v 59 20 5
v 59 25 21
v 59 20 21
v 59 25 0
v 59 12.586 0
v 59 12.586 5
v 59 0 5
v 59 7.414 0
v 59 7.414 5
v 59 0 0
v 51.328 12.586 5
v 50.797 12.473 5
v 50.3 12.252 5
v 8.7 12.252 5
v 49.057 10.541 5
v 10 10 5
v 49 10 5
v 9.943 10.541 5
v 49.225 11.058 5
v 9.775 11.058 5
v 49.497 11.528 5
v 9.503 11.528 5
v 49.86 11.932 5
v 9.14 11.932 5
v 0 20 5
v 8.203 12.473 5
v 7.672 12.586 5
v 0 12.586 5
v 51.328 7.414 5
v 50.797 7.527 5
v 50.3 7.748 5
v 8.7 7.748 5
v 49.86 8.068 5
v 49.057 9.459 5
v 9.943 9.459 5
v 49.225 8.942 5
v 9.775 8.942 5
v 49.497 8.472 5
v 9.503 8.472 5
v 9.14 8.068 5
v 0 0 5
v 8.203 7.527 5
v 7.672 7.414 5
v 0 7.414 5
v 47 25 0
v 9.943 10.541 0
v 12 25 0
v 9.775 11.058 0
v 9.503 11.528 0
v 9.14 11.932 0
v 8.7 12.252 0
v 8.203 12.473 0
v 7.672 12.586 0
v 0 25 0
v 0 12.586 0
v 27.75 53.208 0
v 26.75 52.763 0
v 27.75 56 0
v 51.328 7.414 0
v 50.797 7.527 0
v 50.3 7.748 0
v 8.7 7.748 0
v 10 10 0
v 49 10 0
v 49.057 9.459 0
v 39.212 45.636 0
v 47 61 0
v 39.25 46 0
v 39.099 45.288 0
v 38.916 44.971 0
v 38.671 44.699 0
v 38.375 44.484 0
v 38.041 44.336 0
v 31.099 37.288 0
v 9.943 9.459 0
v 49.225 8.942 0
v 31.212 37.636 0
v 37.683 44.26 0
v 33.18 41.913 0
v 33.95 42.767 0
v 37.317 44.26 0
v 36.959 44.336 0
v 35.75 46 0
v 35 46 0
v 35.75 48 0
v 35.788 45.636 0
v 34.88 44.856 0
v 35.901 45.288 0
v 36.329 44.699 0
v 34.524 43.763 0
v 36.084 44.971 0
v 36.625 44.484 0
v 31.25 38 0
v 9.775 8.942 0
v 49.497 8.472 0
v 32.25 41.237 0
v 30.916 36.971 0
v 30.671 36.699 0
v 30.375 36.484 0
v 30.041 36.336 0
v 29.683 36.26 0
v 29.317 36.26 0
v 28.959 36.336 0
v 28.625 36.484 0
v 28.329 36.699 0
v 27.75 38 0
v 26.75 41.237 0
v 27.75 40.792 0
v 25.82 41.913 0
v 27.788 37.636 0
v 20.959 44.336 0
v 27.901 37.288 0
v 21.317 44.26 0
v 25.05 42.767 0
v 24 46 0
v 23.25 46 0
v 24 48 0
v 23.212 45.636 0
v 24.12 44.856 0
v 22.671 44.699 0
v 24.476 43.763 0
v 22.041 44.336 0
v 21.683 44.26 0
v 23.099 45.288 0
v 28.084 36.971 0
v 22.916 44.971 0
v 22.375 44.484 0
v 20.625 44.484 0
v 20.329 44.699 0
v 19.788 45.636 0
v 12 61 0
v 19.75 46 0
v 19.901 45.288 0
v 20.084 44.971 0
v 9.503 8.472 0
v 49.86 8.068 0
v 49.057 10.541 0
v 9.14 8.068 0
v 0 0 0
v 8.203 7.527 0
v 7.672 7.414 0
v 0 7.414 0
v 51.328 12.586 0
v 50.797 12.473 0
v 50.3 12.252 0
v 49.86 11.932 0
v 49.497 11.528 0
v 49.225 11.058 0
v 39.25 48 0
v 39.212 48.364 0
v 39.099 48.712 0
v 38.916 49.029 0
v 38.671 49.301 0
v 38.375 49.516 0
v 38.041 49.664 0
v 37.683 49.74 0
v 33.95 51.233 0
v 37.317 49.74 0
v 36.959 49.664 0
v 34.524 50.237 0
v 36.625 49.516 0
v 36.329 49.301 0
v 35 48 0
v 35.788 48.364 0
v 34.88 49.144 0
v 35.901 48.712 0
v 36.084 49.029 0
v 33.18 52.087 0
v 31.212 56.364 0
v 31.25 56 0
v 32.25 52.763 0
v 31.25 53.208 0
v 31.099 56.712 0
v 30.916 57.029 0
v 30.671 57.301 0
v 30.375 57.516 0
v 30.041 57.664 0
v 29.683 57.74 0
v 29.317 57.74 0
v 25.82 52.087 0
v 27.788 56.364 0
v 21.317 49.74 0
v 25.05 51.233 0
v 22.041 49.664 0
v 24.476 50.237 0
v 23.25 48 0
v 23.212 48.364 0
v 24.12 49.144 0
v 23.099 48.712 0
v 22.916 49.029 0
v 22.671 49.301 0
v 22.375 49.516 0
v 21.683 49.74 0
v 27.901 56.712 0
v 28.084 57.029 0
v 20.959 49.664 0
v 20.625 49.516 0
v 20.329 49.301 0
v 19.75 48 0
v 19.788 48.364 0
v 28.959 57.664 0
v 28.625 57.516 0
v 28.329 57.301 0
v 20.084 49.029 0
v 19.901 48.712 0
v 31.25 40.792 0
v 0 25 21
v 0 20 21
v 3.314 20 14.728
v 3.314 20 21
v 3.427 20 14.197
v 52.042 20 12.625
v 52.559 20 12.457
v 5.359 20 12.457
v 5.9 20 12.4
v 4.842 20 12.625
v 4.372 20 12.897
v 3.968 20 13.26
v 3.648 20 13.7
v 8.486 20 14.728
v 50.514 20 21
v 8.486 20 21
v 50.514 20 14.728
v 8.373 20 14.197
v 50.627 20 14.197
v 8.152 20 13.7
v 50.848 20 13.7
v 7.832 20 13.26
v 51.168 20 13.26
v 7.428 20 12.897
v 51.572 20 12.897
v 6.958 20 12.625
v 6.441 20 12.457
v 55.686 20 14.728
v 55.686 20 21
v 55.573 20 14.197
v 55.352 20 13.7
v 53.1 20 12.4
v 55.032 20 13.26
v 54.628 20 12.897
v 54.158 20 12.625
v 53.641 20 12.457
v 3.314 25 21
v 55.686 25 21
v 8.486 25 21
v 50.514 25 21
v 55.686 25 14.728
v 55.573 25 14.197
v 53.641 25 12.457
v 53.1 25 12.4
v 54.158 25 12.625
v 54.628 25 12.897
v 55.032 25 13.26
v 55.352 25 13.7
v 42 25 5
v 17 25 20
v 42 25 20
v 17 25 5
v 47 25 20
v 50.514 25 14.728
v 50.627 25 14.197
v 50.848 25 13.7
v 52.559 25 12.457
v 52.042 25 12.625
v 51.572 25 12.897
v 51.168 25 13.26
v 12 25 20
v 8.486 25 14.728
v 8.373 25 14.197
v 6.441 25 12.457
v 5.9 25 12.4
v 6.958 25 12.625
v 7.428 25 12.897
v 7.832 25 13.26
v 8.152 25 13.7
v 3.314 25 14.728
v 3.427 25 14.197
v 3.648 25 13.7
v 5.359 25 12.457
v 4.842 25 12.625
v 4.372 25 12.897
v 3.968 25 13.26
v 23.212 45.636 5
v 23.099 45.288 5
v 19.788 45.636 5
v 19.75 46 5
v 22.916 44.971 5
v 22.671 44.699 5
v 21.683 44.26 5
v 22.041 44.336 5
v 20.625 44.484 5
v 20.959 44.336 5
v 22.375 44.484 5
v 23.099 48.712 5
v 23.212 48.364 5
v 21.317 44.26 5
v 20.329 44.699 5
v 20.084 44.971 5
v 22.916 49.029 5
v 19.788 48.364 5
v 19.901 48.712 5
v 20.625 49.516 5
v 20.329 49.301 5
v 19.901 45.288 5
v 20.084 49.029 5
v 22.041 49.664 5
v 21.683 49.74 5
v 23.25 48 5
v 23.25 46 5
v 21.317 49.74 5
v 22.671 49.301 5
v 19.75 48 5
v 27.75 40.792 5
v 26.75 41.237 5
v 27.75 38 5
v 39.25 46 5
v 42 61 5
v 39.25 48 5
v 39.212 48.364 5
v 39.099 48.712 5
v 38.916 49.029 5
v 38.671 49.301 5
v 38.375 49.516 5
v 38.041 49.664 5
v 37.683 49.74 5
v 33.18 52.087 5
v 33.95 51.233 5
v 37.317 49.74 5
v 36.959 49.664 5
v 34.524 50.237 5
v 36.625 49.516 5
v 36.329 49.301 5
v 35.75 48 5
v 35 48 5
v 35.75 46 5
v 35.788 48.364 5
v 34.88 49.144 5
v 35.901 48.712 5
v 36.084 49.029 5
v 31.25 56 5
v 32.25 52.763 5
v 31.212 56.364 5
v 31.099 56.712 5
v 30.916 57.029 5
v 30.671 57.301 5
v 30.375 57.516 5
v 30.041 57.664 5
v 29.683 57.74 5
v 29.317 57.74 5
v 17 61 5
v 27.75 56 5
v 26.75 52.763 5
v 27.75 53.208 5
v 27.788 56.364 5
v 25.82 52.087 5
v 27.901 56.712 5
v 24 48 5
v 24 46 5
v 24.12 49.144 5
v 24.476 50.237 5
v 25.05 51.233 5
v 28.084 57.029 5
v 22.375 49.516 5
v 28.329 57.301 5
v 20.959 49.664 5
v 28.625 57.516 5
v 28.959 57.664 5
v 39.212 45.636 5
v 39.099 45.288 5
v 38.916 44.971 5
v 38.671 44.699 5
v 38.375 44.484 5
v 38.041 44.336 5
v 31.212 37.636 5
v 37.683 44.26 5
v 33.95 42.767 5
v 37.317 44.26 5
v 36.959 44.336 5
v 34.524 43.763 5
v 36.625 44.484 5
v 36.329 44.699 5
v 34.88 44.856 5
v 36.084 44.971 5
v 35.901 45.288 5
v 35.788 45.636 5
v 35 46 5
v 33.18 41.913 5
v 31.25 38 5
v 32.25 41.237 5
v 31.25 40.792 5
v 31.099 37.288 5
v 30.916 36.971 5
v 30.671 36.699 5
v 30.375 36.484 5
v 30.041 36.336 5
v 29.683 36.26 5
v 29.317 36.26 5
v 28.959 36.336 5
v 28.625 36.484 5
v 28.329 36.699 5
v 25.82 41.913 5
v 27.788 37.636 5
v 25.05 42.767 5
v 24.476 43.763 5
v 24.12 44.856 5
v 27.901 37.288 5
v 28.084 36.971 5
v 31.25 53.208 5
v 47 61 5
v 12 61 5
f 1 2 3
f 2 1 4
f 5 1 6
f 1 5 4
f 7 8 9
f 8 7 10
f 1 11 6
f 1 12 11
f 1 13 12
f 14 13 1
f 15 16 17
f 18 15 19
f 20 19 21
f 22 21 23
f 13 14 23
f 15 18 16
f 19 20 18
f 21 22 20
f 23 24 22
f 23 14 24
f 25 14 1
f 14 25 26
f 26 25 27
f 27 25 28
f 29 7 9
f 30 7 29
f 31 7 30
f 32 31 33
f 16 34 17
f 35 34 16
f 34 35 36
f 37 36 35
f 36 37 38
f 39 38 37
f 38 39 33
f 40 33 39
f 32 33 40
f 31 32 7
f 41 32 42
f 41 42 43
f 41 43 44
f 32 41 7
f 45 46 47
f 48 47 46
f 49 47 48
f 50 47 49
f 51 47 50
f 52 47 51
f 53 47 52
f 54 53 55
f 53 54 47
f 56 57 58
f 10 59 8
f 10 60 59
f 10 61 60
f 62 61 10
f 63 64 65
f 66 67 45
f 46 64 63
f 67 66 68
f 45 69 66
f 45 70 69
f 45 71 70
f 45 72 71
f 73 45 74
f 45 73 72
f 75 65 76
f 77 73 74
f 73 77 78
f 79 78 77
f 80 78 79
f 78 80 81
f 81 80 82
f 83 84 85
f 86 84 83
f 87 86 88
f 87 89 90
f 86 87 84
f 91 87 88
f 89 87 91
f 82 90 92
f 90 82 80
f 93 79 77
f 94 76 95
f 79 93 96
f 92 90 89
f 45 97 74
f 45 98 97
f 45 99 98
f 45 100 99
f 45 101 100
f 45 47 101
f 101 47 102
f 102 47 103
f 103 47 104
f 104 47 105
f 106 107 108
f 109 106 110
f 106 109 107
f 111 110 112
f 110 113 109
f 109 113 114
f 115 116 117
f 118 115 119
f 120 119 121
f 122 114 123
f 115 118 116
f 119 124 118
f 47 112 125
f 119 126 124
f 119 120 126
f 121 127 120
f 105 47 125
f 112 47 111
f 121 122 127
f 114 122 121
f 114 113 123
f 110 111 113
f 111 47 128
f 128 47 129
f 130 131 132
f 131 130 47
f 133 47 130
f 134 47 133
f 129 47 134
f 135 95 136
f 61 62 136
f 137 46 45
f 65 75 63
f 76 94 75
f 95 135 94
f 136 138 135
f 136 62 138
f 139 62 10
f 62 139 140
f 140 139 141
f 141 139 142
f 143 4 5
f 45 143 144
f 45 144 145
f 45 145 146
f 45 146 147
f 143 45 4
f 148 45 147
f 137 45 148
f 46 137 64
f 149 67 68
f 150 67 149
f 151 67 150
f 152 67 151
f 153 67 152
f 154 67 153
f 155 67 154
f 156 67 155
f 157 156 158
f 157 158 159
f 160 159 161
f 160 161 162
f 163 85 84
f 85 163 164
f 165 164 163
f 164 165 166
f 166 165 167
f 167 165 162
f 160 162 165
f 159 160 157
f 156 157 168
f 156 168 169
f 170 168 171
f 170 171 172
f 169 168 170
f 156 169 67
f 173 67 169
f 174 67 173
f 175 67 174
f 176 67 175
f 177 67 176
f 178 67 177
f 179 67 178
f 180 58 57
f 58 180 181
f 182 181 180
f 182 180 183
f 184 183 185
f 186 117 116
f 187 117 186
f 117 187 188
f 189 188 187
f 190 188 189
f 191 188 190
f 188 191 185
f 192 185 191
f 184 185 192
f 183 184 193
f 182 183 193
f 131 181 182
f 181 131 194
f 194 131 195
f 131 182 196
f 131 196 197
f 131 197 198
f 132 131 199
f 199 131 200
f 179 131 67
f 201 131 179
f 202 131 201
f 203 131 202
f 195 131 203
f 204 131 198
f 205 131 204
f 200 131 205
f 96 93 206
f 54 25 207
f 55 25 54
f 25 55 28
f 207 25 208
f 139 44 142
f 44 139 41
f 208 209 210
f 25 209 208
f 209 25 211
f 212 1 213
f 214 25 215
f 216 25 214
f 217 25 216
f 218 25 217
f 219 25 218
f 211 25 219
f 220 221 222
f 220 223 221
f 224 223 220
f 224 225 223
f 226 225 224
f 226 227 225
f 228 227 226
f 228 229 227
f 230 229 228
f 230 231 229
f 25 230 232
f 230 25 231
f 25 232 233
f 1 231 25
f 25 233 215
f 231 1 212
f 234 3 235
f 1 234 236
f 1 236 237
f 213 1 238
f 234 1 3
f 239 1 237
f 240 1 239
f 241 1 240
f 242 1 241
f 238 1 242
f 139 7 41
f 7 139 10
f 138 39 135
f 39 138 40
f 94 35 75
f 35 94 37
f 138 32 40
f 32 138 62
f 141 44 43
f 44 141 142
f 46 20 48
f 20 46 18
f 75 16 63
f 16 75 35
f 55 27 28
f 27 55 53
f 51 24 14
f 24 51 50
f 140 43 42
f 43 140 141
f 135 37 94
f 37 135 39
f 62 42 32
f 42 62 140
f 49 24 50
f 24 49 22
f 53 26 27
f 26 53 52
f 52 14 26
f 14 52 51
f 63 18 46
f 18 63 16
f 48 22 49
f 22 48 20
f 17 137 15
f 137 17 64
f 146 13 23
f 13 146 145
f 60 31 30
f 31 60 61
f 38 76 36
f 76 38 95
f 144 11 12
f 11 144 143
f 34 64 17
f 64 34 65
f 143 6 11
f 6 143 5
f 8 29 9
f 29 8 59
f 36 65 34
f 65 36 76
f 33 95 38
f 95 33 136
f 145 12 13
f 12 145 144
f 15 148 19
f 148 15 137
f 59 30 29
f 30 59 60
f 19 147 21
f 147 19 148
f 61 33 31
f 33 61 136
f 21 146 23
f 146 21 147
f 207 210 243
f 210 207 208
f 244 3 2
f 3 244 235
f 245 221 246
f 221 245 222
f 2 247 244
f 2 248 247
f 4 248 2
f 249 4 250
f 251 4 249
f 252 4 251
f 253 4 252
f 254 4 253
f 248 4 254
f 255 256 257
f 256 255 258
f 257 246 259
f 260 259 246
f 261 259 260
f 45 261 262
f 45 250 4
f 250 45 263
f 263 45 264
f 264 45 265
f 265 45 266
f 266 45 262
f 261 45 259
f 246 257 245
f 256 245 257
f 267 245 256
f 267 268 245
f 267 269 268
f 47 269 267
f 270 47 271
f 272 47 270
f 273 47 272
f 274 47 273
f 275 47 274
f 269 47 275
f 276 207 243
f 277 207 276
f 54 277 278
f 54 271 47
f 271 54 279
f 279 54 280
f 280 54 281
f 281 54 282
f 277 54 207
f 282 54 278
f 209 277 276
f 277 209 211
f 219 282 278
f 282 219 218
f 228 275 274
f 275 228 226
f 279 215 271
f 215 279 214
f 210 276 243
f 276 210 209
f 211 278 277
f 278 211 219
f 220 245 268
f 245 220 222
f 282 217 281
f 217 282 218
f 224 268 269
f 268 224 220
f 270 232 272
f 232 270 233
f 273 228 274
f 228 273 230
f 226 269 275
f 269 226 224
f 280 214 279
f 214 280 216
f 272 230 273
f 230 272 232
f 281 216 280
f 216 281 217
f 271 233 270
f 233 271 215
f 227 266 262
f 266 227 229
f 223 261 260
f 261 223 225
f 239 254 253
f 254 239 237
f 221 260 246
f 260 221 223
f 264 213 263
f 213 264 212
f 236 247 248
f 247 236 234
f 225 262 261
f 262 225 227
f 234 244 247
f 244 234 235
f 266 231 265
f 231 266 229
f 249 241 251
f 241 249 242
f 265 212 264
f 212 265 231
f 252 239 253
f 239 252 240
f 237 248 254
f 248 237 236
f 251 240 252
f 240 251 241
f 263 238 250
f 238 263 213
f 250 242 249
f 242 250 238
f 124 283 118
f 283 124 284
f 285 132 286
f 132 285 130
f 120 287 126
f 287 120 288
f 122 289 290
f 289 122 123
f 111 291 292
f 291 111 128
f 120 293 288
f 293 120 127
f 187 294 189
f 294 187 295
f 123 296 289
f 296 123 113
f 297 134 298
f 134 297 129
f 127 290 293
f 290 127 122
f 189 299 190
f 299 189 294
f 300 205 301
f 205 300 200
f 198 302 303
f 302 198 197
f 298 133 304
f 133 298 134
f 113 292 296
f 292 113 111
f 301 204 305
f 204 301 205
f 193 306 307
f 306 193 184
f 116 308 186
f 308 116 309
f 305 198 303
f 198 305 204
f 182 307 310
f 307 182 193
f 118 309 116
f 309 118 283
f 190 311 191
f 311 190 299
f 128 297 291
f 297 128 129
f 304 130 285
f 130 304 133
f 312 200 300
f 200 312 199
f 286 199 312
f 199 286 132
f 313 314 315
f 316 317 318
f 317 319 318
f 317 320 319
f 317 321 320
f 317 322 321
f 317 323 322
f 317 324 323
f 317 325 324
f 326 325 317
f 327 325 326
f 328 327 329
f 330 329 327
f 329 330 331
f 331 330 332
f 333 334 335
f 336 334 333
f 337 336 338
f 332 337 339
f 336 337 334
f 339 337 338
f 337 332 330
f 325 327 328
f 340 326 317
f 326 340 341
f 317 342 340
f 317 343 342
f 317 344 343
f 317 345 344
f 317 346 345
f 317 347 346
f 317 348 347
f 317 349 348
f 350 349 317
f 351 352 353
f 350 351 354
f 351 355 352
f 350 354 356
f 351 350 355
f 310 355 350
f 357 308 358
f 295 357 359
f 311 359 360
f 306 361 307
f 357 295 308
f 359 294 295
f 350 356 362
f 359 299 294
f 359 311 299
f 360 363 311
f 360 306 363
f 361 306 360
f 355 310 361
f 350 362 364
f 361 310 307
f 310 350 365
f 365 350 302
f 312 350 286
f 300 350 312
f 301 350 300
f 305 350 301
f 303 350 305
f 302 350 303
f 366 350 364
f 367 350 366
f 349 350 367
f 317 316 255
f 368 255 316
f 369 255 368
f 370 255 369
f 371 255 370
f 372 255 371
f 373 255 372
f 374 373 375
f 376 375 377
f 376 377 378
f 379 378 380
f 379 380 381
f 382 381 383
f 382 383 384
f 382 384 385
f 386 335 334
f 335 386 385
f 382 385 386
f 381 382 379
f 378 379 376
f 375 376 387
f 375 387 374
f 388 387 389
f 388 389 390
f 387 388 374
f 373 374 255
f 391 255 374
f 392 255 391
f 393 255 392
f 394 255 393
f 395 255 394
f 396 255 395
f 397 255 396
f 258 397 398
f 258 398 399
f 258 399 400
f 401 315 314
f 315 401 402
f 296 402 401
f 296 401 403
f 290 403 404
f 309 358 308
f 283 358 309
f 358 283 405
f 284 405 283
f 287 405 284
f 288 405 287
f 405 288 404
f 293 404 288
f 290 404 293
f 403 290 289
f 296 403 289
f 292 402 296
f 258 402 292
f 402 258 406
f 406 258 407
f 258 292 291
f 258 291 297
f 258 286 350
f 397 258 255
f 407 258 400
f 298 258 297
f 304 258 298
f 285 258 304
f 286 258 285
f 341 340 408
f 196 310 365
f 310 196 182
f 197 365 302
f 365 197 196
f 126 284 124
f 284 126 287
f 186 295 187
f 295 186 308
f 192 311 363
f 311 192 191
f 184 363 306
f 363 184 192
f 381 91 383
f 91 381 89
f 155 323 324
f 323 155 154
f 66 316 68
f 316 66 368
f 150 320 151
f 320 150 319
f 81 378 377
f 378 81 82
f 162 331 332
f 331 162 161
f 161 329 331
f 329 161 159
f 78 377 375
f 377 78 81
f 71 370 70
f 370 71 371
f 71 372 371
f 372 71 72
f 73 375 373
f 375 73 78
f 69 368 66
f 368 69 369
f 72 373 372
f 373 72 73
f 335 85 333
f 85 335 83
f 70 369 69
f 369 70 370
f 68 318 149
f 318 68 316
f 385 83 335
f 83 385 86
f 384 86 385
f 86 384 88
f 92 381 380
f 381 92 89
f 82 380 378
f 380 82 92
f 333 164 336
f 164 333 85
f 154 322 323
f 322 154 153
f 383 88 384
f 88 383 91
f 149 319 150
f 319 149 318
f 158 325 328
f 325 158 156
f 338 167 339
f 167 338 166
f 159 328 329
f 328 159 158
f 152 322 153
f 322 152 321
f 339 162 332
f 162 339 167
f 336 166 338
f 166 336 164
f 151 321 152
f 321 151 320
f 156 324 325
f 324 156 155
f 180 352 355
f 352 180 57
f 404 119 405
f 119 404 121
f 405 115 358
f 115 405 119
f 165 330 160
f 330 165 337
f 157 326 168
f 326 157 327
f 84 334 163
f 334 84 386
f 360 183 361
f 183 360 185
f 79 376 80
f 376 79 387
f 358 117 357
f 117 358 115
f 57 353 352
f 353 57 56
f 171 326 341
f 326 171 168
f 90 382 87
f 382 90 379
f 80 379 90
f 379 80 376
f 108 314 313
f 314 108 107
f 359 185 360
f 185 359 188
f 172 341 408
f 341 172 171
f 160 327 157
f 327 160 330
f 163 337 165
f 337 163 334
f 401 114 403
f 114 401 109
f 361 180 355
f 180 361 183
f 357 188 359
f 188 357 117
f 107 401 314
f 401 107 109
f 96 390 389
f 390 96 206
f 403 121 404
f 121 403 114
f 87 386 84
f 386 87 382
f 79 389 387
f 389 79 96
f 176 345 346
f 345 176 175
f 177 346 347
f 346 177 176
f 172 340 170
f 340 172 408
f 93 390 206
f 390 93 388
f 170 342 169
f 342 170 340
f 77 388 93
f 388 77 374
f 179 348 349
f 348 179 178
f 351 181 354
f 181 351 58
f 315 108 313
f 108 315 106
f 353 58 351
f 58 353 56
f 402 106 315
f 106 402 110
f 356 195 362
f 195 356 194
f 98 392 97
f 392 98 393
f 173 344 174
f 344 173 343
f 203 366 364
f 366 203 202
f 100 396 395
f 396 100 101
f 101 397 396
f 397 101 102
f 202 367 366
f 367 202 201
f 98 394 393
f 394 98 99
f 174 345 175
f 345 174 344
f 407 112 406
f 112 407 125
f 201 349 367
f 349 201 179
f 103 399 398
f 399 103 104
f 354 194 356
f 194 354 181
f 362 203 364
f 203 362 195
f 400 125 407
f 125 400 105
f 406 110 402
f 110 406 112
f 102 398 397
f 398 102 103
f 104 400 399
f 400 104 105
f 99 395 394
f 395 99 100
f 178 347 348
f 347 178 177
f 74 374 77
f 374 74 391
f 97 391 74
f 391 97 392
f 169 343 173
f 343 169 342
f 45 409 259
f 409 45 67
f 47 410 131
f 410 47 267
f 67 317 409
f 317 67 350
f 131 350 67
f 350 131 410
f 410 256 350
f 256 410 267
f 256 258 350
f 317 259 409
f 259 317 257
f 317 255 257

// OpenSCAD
//translate([-35,30, 0])
//import ("Z_Nut_Braket_1.1.stl");

//Length of the part on the extrustion. For T10: 69
length = 59;

//Size of the extrusion
extrusion = 20;     // [15, 20, 30]

//Screw size of the extrusion
screw_hole = 5.2;   // [3.2:M3, 4.2:M4, 5.2:M5]

//Thickness of the walls everywhere
wall_thickness = 5;

//Distance from the extrsuion to the center of the nut
distance_to_nut = 27;

//Width of the part holding the nut. For T10: 45
nut_holding_part_width = 35;

//Length of the part holding the nut. For T10: 40
nut_holding_part_length = 36;

//The middle diameter of the nut For T8 it's 10.2, but 11 gives it some play. For T10: 17
nut_middle_diameter = 11;

//The position of the screws from the center of the nut. For T10 : 24
nut_screw_position_diameter = 16;

//The diameter of the screw holes on the nut. For T10: 3.5 still
nut_screw_diameter = 3.5;

/* [Hidden] */
$fn = 30;

difference() {
    cube([length, extrusion, wall_thickness]);
    
    translate([(extrusion / 2) - (screw_hole/2), extrusion / 2, 0])
        hull() {
        cylinder(d = screw_hole, h = wall_thickness);
            
        translate([-(extrusion / 2) - (screw_hole/2), 0, 0])
        cylinder(d = screw_hole, h = wall_thickness);
        }
    
    translate([length - (extrusion / 2) + (screw_hole/2), extrusion / 2, 0])
        hull() {
        cylinder(d = screw_hole, h = wall_thickness);
            
        translate([(extrusion / 2) + (screw_hole/2), 0, 0])
        cylinder(d = screw_hole, h = wall_thickness);
    }
}

//Going up
translate([0, extrusion, 0]) {
    difference() {
        cube([length, wall_thickness, extrusion + 1]);
        translate([5.9, 0, extrusion / 2 + wall_thickness]) {
            hull() {
                rotate([0,90,90])
                cylinder(d = screw_hole, h = wall_thickness);
                
                translate([0,0,length])
                rotate([0,90,90])
                cylinder(d = screw_hole, h = wall_thickness);
            }
        }
        
        translate([length - 5.9, 0, extrusion / 2 + wall_thickness]) {
            hull() {
                rotate([0,90,90])
                cylinder(d = screw_hole, h = wall_thickness);
                
                translate([0,0,length])
                rotate([0,90,90])
                cylinder(d = screw_hole, h = wall_thickness);
            }
        }
    }
}

translate([(length - nut_holding_part_width)/2, extrusion + wall_thickness, 0]) {
    //Actual nut part
    difference() {
        cube([nut_holding_part_width, nut_holding_part_length, wall_thickness]);
        
        translate([nut_holding_part_width/2, distance_to_nut - wall_thickness, 0]) {
            
            //Oval that has a radius of 3.5 and 5.5
            translate([-nut_screw_position_diameter / 2, 0, 0]) {
                hull() {
                    translate([0,-1,0])
                    cylinder(d = nut_screw_diameter, h = wall_thickness);
                    translate([0,1,0])
                    cylinder(d = nut_screw_diameter, h = wall_thickness);
                }
            }

            translate([nut_screw_position_diameter / 2, 0, 0]) {
                hull() {
                    translate([0,-1,0])
                    cylinder(d = nut_screw_diameter, h = wall_thickness);
                    translate([0,1,0])
                    cylinder(d = nut_screw_diameter, h = wall_thickness);
                }
            }

            hull() {
                translate([0, -1, 0])
                cylinder(d = nut_middle_diameter, h = wall_thickness);
                translate([0,1,0])
                cylinder(d = nut_middle_diameter, h = wall_thickness);
            }
            
            hull() {
                translate([0, -nut_screw_position_diameter / 2 - 1, 0])
                cylinder(d = nut_screw_diameter, h = wall_thickness);
                translate([0, nut_screw_position_diameter / 2 + 1, 0])
                cylinder(d = nut_screw_diameter, h = wall_thickness);
            }
        }
    }
    
    translate([0,0,wall_thickness])
    prism(wall_thickness, nut_holding_part_length, extrusion - wall_thickness);
    
    translate([nut_holding_part_width - wall_thickness,0,wall_thickness])
    prism(wall_thickness, nut_holding_part_length, extrusion - wall_thickness);
}


module prism(l, w, h){
   polyhedron(
           points=[[0,0,0], [l,0,0], [l,w,0], [0,w,0], [0,0,h], [l,0,h]],
           faces=[[0,1,2,3],[5,4,3,2],[0,4,5,1],[0,3,4],[5,2,1]]
           );

   }
